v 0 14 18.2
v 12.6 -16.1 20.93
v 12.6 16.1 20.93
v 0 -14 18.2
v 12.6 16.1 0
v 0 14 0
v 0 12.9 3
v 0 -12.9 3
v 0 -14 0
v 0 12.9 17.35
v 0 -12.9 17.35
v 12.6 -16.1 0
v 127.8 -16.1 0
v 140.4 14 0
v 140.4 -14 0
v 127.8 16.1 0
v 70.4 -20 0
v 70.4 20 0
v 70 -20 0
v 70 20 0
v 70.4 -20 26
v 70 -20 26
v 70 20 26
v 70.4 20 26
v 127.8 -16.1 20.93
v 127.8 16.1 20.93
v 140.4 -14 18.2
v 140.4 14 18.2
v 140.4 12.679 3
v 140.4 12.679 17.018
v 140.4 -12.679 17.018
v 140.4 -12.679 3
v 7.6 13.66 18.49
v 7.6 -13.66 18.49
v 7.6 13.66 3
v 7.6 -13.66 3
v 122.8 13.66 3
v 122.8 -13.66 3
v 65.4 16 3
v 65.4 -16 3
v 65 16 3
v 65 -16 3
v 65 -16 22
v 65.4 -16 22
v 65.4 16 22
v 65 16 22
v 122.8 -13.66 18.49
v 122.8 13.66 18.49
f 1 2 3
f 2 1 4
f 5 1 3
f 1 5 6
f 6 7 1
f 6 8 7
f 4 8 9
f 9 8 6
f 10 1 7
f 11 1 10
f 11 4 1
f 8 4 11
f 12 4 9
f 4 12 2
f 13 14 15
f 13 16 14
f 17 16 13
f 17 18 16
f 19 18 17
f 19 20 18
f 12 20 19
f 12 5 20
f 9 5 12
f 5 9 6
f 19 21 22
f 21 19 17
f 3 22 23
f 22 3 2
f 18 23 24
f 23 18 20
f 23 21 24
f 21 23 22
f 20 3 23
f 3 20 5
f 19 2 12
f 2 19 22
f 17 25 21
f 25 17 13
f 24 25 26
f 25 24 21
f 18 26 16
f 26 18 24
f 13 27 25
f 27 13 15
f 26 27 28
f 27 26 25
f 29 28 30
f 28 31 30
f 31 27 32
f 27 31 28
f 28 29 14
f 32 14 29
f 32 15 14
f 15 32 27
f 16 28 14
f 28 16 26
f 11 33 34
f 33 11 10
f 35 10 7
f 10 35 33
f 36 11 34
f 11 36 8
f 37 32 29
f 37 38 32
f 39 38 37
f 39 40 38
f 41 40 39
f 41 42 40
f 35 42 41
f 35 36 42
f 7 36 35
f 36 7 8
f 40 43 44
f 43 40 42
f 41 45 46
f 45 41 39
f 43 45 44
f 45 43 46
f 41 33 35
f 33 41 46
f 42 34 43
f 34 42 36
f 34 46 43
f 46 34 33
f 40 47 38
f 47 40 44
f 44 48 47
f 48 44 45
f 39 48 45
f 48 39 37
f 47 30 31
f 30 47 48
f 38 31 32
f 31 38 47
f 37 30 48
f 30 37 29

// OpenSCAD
$fn = 32;

// ----------------------------------------------------------------------
// Faired channel: 140 x 40 x 26 mm, 4 mm walls, faired ends
// ----------------------------------------------------------------------

// --- parameters (mm) ---
length = 140;             // channel length
width = 40;               // channel width at mid length
height = 26;              // channel height at mid length
wall = 4;                 // side wall thickness
floor_t = 3;              // floor thickness
end_w = 28;               // faired end width
end_h = 18.2;             // faired end height

difference() {
  union() {
    hull() {
      translate([0, -14, 0]) cube([0.4, 28, 18.2]);
      translate([12.6, -16.1, 0]) cube([0.4, 32.2, 20.93]);
    }
    hull() {
      translate([12.6, -16.1, 0]) cube([0.4, 32.2, 20.93]);
      translate([70, -20, 0]) cube([0.4, 40, 26]);
    }
    hull() {
      translate([70, -20, 0]) cube([0.4, 40, 26]);
      translate([127.4, -16.1, 0]) cube([0.4, 32.2, 20.93]);
    }
    hull() {
      translate([127.4, -16.1, 0]) cube([0.4, 32.2, 20.93]);
      translate([140, -14, 0]) cube([0.4, 28, 18.2]);
    }
  }
  /* cavity, 5 mm proud of both ends so the ports are cut clean */
  hull() {
    translate([-5, -12.4, 3]) cube([0.4, 24.8, 13.6]);
    translate([7.6, -13.66, 3]) cube([0.4, 27.32, 15.49]);
  }
  hull() {
    translate([7.6, -13.66, 3]) cube([0.4, 27.32, 15.49]);
    translate([65, -16, 3]) cube([0.4, 32, 19]);
  }
  hull() {
    translate([65, -16, 3]) cube([0.4, 32, 19]);
    translate([122.4, -13.66, 3]) cube([0.4, 27.32, 15.49]);
  }
  hull() {
    translate([122.4, -13.66, 3]) cube([0.4, 27.32, 15.49]);
    translate([145, -12.4, 3]) cube([0.4, 24.8, 13.6]);
  }
}
